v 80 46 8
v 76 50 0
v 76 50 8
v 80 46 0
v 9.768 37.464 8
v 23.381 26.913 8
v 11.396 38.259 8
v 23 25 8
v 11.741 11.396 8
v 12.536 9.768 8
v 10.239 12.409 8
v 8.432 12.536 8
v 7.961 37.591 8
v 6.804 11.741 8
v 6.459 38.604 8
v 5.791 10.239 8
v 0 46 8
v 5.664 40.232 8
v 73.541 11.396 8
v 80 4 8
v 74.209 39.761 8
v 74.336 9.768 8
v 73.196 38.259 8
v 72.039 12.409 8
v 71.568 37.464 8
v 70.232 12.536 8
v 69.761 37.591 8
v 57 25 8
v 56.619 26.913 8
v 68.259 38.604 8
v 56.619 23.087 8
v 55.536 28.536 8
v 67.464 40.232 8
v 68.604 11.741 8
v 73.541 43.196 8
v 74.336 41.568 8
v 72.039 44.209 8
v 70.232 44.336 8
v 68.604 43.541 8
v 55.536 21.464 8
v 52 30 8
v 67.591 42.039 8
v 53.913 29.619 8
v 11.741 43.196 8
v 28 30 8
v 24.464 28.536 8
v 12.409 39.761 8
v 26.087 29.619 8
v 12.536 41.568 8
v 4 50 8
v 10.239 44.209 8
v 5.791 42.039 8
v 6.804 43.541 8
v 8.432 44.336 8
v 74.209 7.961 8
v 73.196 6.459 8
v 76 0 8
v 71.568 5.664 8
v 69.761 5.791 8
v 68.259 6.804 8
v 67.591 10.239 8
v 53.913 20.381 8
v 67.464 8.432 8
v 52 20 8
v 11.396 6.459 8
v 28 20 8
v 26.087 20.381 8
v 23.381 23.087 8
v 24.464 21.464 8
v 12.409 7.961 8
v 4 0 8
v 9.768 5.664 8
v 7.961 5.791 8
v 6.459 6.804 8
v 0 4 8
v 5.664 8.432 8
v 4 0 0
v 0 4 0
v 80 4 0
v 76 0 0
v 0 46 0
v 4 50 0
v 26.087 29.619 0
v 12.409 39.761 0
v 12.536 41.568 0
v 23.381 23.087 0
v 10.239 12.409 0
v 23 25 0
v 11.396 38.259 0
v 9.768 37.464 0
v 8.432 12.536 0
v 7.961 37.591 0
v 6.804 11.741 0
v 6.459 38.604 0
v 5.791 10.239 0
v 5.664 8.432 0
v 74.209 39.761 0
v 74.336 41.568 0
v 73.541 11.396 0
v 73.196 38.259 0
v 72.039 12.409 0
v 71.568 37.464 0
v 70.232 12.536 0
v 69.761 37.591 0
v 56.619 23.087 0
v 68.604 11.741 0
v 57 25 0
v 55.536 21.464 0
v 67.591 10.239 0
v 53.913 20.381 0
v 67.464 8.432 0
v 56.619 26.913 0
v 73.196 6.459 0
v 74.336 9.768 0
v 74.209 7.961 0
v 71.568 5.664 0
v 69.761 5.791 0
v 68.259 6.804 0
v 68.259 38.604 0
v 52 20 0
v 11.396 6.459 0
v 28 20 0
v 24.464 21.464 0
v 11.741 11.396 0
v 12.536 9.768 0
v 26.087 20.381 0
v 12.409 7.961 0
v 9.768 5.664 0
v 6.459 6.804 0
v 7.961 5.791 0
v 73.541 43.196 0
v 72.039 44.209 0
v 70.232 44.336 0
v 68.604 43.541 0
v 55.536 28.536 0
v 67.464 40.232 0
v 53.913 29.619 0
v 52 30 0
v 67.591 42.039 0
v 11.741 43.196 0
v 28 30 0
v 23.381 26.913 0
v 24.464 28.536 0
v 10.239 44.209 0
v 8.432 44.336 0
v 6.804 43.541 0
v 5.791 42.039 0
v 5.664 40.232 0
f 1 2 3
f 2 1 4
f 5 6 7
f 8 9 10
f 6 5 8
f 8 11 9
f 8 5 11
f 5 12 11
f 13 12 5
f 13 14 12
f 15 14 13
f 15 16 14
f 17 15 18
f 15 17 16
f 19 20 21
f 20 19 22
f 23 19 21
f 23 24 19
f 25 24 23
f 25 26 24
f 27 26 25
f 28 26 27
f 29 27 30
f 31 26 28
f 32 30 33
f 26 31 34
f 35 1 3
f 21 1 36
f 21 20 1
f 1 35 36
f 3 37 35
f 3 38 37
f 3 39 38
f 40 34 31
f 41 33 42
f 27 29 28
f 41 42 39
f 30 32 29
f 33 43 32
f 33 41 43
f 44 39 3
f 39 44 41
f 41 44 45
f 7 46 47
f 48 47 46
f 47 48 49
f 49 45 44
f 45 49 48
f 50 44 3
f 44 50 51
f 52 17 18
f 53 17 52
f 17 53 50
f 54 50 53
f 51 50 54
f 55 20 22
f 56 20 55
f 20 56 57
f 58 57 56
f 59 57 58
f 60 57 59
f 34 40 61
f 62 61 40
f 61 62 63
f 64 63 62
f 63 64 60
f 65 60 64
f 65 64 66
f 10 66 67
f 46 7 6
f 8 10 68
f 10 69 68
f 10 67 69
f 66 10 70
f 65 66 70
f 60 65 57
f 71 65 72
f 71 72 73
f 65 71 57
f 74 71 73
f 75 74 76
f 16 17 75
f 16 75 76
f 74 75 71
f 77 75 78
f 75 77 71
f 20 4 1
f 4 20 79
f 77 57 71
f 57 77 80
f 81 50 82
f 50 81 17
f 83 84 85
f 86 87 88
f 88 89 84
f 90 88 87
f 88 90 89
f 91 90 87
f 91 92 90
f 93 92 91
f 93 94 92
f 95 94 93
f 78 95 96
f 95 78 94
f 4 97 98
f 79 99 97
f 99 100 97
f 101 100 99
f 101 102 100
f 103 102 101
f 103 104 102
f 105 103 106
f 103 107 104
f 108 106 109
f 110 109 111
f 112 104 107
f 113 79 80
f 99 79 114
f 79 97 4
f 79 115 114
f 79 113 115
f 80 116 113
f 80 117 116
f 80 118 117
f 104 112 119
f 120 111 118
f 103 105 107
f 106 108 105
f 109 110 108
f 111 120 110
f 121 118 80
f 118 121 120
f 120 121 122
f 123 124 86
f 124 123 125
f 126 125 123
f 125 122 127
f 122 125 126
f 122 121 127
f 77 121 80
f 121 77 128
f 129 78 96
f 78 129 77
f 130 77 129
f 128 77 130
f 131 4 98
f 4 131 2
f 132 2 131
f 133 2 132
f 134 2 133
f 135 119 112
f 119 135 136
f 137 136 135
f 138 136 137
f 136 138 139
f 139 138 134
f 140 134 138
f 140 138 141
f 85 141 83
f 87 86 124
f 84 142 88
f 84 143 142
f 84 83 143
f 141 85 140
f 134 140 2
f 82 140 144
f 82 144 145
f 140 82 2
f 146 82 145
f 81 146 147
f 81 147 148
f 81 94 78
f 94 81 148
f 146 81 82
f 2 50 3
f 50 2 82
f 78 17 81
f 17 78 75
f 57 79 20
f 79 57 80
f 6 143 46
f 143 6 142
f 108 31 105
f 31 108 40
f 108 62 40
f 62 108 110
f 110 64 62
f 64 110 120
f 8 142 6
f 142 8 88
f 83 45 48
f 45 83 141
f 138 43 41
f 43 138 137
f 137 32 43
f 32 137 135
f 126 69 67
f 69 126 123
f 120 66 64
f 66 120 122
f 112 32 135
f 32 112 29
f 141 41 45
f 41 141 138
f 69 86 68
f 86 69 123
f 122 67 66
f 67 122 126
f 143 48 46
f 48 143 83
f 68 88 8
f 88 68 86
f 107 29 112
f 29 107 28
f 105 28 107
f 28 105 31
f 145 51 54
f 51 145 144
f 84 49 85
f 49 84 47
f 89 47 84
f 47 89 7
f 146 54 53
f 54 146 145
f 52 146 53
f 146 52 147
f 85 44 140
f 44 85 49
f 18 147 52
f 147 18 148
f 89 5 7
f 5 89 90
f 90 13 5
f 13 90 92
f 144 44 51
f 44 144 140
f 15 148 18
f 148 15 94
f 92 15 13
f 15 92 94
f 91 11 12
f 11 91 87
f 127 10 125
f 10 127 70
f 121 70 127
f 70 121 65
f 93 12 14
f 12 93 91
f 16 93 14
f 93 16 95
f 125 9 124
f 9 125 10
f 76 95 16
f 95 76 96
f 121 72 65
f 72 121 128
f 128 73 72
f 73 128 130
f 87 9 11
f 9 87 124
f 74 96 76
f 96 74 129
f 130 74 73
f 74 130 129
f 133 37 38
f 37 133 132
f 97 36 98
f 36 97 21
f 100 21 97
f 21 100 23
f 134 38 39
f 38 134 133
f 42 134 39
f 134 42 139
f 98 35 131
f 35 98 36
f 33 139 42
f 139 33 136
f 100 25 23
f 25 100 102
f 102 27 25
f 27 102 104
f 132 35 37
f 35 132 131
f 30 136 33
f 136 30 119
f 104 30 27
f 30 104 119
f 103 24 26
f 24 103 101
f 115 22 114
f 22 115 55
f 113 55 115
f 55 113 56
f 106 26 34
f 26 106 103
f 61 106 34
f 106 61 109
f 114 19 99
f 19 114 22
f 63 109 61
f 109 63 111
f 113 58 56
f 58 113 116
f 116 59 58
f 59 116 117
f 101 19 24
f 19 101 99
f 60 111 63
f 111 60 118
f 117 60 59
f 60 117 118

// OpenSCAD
$fn = 32;

// ----------------------------------------------------------------------
// Bracket plate: slot plate 80 x 50
// ----------------------------------------------------------------------

// --- parameters (mm) ---
hole_r = 3.5;             // bolt hole radius
plate_t = 8;              // plate thickness, Z (extrusion height)
plate_l = 80;             // plate length
plate_w = 50;             // plate width
slot_l = 24;              // slot straight length
slot_r = 5;               // slot end radius

slot_len = slot_l + 2 * slot_r;
slot_w = 2 * slot_r;
hole_d2 = 2 * hole_r;

profile = [[4, 0], [76, 0], [80, 4], [80, 46], [76, 50], [4, 50], [0, 46], [0, 4]];  // primary outline, 8 points, counter clockwise
void_1 = [[52, 20], [53.913, 20.381], [55.536, 21.464], [56.619, 23.087], [57, 25], [56.619, 26.913], [55.536, 28.536], [53.913, 29.619], [52, 30], [28, 30], [26.087, 29.619], [24.464, 28.536], [23.381, 26.913], [23, 25], [23.381, 23.087], [24.464, 21.464], [26.087, 20.381], [28, 20]];  // grip slot, 18 points
void_2 = [[12.536, 41.568], [11.741, 43.196], [10.239, 44.209], [8.432, 44.336], [6.804, 43.541], [5.791, 42.039], [5.664, 40.232], [6.459, 38.604], [7.961, 37.591], [9.768, 37.464], [11.396, 38.259], [12.409, 39.761]];  // corner hole, 12 points
void_3 = [[12.536, 9.768], [11.741, 11.396], [10.239, 12.409], [8.432, 12.536], [6.804, 11.741], [5.791, 10.239], [5.664, 8.432], [6.459, 6.804], [7.961, 5.791], [9.768, 5.664], [11.396, 6.459], [12.409, 7.961]];  // corner hole, 12 points
void_4 = [[74.336, 41.568], [73.541, 43.196], [72.039, 44.209], [70.232, 44.336], [68.604, 43.541], [67.591, 42.039], [67.464, 40.232], [68.259, 38.604], [69.761, 37.591], [71.568, 37.464], [73.196, 38.259], [74.209, 39.761]];  // corner hole, 12 points
void_5 = [[74.336, 9.768], [73.541, 11.396], [72.039, 12.409], [70.232, 12.536], [68.604, 11.741], [67.591, 10.239], [67.464, 8.432], [68.259, 6.804], [69.761, 5.791], [71.568, 5.664], [73.196, 6.459], [74.209, 7.961]];  // corner hole, 12 points

// --- the one profile operation ---
difference() {
  linear_extrude(height = plate_t) polygon(points = profile);
  translate([0, 0, -1])
    linear_extrude(height = plate_t + 2) polygon(points = void_1);
  translate([0, 0, -1])
    linear_extrude(height = plate_t + 2) polygon(points = void_2);
  translate([0, 0, -1])
    linear_extrude(height = plate_t + 2) polygon(points = void_3);
  translate([0, 0, -1])
    linear_extrude(height = plate_t + 2) polygon(points = void_4);
  translate([0, 0, -1])
    linear_extrude(height = plate_t + 2) polygon(points = void_5);
}
